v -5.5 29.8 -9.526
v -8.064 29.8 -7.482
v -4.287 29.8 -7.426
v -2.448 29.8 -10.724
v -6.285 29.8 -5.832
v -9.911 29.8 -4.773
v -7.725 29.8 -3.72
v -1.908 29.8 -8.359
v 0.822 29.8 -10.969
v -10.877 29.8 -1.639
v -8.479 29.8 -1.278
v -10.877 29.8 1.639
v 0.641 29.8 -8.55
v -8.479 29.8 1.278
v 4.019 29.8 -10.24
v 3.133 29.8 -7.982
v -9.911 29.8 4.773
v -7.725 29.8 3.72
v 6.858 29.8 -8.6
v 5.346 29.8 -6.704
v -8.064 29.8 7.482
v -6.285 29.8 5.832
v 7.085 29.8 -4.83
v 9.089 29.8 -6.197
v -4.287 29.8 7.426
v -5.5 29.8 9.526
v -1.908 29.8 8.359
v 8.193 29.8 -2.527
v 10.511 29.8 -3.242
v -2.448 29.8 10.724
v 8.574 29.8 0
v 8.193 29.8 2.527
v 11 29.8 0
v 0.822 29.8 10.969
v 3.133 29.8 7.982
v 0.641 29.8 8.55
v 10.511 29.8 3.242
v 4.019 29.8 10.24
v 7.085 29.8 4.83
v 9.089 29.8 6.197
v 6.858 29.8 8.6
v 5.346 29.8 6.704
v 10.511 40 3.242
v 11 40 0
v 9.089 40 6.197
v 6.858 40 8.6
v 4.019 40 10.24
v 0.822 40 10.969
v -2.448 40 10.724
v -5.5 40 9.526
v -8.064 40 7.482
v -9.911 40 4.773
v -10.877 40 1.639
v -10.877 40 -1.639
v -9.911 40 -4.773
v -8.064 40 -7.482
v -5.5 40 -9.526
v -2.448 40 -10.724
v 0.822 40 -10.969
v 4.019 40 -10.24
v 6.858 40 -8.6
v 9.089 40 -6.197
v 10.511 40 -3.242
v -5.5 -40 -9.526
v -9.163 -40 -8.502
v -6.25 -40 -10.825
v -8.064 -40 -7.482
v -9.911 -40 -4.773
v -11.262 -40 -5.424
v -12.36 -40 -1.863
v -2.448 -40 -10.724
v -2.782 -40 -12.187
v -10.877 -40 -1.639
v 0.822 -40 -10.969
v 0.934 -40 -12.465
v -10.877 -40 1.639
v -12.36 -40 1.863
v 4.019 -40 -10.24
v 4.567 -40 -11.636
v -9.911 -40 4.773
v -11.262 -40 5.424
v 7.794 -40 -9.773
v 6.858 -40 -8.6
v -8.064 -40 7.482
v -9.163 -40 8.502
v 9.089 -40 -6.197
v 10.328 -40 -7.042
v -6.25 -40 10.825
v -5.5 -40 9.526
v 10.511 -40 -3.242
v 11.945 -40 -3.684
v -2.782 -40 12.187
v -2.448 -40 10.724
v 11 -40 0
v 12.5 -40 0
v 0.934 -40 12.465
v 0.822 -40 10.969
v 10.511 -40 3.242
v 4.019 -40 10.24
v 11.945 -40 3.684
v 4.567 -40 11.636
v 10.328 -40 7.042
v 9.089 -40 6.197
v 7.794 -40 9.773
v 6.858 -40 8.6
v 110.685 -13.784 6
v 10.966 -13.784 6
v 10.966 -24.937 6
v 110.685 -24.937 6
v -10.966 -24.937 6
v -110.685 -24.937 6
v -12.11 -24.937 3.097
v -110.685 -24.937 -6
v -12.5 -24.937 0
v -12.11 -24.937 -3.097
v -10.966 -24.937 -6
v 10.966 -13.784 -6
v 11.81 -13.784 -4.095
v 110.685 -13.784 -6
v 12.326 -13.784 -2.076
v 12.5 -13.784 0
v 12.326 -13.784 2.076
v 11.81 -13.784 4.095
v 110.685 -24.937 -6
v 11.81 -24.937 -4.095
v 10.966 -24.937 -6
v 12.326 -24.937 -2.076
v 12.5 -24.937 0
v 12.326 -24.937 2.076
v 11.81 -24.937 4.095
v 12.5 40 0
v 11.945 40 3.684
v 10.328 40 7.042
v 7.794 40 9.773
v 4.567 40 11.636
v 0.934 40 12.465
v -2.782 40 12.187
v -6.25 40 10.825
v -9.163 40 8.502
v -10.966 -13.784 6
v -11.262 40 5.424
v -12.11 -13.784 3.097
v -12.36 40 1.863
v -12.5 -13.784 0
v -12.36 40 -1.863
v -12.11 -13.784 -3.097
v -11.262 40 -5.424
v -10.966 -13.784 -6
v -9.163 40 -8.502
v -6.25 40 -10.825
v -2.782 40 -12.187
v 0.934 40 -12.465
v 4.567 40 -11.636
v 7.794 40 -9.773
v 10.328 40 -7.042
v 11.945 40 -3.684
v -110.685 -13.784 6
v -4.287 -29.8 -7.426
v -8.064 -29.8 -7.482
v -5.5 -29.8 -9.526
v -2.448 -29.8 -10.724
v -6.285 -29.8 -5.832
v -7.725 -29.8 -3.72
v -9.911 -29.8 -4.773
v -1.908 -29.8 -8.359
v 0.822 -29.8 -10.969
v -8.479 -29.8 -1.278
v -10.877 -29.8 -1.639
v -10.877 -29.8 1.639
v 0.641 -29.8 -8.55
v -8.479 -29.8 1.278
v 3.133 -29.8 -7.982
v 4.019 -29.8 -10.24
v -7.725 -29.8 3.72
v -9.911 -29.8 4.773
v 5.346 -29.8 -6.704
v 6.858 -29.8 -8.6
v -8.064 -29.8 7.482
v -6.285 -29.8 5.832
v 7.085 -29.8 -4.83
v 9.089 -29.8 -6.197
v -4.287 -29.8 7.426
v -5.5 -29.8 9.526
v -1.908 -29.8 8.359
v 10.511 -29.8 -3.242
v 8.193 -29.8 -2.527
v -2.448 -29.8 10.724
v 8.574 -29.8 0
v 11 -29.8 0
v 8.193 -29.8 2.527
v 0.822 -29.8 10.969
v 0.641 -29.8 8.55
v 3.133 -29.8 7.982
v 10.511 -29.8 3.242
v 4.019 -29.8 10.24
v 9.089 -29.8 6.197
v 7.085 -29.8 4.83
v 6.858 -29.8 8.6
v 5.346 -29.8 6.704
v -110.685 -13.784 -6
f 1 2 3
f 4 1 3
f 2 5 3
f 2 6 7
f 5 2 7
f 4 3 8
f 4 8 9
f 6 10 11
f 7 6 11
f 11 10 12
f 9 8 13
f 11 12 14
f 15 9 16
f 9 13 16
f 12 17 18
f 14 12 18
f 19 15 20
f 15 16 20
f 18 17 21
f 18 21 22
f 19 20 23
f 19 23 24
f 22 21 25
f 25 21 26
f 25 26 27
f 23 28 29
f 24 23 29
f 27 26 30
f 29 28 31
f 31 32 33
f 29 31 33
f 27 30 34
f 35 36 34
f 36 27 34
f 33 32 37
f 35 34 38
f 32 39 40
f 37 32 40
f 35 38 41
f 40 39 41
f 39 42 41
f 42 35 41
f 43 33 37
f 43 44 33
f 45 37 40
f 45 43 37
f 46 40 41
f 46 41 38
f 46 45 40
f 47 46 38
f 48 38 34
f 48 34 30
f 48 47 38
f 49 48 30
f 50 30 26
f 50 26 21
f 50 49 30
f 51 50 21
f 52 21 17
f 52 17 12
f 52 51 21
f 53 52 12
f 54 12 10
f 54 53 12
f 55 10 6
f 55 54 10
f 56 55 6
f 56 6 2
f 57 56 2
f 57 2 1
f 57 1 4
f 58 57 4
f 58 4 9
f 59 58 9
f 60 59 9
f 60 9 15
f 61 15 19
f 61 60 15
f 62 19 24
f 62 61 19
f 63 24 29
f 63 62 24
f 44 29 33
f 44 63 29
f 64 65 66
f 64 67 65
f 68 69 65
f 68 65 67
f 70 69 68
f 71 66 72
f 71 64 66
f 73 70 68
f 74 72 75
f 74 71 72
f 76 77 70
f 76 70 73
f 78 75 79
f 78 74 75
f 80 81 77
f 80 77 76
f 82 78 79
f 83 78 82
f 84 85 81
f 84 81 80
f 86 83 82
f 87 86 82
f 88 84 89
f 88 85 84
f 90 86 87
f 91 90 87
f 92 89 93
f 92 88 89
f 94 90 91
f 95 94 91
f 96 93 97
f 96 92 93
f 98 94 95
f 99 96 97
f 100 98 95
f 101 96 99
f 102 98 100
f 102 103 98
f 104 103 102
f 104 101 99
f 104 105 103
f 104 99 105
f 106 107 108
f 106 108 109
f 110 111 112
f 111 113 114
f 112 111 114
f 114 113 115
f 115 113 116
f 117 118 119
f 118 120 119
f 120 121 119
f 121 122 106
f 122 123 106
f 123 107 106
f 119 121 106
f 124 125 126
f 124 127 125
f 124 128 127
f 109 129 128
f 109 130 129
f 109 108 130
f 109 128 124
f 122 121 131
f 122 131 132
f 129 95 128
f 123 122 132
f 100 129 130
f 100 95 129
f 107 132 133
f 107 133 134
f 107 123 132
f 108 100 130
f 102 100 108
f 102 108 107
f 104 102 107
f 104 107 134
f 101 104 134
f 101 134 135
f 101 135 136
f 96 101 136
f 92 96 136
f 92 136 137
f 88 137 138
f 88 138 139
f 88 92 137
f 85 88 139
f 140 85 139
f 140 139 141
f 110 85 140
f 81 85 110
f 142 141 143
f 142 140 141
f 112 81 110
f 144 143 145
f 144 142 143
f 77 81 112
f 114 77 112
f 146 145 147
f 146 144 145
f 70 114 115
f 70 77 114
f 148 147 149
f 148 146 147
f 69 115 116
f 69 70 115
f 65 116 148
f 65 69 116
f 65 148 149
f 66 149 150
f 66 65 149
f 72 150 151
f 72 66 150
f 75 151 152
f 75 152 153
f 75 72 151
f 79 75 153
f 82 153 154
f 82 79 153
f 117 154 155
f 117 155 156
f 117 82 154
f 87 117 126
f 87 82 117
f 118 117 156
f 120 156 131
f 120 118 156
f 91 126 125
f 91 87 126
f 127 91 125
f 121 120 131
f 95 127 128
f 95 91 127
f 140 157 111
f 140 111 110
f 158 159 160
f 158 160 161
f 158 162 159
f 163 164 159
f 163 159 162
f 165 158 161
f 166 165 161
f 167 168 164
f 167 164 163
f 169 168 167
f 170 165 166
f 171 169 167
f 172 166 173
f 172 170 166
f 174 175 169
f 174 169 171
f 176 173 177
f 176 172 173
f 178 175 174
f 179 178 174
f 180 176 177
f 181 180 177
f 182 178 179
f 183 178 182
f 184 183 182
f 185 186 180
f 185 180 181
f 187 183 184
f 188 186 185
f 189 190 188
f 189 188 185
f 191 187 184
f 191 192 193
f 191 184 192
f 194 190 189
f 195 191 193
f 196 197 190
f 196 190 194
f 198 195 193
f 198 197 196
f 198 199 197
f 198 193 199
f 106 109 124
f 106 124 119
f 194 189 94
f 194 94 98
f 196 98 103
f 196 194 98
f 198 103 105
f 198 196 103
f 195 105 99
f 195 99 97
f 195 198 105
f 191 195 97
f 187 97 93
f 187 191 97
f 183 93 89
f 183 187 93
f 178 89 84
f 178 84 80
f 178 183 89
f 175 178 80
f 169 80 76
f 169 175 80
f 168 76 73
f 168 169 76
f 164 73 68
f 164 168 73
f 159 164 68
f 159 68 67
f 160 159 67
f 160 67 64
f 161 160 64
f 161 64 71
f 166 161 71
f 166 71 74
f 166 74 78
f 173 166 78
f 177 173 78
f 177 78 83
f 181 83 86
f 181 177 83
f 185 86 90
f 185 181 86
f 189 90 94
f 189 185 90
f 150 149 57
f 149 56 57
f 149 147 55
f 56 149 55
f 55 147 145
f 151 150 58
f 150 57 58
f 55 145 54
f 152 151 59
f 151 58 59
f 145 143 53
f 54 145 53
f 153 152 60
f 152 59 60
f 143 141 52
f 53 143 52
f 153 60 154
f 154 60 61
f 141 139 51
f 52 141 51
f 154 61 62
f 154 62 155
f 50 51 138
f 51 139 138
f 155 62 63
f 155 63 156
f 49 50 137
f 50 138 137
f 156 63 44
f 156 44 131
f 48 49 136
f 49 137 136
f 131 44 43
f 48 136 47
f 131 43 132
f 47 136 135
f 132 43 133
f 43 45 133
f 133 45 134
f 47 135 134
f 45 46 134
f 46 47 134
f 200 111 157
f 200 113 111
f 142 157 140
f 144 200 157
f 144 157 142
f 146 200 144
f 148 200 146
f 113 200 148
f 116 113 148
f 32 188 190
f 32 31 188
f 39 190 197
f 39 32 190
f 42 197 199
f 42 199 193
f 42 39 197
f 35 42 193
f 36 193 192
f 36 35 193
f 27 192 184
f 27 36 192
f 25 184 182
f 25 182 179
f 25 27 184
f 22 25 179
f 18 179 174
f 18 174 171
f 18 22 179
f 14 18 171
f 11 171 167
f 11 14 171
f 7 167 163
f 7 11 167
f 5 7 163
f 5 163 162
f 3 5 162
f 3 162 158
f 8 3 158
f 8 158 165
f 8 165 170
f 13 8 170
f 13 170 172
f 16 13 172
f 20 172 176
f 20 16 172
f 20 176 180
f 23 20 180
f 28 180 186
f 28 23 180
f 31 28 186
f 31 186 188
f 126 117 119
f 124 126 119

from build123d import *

# Parameters (mm, degrees)
F0_R     = 12.5
F0_R_2   = 11
F1_DEPTH = 40
F2_R     = 11
F2_R_2   = 8.574422
F3_DEPTH = 29.8
F4_W     = 100
F4_H     = 11.153503
F5_DEPTH = 6


with BuildPart() as f1:
    # F0 (on Front) → F1 (new body, symmetric)
    with BuildSketch(Plane.XZ):
        Circle(F0_R)
        Circle(F0_R_2, mode=Mode.SUBTRACT)
    extrude(amount=F1_DEPTH, both=True)

    # F2 (on Front) → F3 (join, symmetric)
    with BuildSketch(Plane.XZ):
        Circle(F2_R)
        Circle(F2_R_2, mode=Mode.SUBTRACT)
    extrude(amount=F3_DEPTH, both=True)

    # F4 (on Top) → F5 (join, symmetric)
    with BuildSketch(Plane.XY):
        with Locations((-60.685454, -19.360414)):
            Rectangle(F4_W, F4_H)
        with Locations((60.685454, -19.360414)):
            Rectangle(F4_W, F4_H)
    extrude(amount=F5_DEPTH, both=True)


solid = f1.part
